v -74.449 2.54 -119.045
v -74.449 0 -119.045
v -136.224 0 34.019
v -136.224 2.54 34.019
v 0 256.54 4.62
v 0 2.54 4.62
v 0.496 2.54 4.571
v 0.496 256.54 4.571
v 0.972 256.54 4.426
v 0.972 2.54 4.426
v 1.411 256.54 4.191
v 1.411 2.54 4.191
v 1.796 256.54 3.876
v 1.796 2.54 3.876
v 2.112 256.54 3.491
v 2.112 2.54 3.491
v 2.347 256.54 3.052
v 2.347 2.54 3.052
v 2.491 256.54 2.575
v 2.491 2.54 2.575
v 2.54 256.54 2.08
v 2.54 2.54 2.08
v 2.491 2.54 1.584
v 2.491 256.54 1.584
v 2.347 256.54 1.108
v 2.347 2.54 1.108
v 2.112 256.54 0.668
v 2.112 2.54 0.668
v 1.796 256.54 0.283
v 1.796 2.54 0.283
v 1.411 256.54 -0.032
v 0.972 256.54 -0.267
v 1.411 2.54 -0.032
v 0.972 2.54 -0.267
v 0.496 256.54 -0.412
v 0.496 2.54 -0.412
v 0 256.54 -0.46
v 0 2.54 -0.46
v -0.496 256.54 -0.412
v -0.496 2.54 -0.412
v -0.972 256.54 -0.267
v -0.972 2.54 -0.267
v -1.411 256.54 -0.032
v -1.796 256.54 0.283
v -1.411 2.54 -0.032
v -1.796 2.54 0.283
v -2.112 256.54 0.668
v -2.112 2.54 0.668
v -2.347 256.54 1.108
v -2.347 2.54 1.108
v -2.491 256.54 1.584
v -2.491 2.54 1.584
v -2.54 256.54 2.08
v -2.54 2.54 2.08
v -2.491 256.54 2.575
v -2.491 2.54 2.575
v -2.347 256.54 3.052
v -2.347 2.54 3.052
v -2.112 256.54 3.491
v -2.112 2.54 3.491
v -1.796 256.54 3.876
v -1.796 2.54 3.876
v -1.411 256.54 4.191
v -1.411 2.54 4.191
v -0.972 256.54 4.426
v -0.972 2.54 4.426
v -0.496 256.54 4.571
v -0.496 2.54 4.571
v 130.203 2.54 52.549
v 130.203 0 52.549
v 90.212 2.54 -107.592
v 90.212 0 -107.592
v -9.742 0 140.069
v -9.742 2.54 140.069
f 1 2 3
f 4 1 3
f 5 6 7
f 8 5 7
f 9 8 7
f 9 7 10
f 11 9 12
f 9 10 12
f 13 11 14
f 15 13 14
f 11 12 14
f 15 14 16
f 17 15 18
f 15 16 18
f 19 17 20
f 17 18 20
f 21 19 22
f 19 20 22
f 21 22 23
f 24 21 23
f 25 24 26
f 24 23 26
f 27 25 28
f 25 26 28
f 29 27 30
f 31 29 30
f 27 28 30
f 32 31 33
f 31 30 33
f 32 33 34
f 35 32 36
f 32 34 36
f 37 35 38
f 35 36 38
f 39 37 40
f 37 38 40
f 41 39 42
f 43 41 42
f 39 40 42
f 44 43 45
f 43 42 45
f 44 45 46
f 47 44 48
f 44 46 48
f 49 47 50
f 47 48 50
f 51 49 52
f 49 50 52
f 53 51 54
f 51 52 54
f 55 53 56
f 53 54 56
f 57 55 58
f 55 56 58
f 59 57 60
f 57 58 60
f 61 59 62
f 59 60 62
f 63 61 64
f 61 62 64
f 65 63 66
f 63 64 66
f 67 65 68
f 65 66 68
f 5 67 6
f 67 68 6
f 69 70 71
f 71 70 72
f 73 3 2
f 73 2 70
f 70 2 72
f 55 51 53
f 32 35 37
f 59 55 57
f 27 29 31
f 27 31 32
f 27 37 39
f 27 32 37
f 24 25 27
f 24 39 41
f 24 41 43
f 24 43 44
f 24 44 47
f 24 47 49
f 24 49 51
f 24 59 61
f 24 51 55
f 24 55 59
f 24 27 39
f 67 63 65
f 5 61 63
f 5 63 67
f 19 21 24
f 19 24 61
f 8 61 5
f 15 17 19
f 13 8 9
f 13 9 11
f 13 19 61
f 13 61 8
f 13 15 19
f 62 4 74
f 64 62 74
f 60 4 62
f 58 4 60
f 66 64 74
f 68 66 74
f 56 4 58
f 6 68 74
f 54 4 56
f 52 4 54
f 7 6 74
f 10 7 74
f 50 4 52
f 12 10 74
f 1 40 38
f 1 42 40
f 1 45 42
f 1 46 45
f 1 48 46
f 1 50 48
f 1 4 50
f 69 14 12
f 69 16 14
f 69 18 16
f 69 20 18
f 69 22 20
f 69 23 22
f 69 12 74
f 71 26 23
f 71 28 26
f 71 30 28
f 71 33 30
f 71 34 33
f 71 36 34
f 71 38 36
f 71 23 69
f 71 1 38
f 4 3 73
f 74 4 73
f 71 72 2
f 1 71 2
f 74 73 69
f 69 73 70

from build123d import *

# Parameters (mm, degrees)
BOSS_EXTRUDE3_DEPTH = 2.54
SKETCH4_R           = 2.54
BOSS_EXTRUDE4_DEPTH = 254


with BuildPart() as part:
    # Sketch3 → Boss-Extrude3 (new body)
    with BuildSketch(Plane(origin=(0, 0, 0), x_dir=(1, 0, 0), z_dir=(0, 1, 0))):
        Polygon((90.212065812, 107.592372069), (-74.449365126, 119.044644473), (-136.224303901, -34.018735606), (-9.741884778, -140.069379332), (130.203487993, -52.548901604), align=None)
    extrude(amount=BOSS_EXTRUDE3_DEPTH)

    # Sketch4 → Boss-Extrude4 (add)
    with BuildSketch(Plane(origin=(0, 2.54, 0), x_dir=(1, 0, 0), z_dir=(0, 1, 0))):
        with Locations(Location((0, -2.079529354, 0), (0, 0, 270))):
            Circle(SKETCH4_R)
    extrude(amount=BOSS_EXTRUDE4_DEPTH)


solid = part.part
